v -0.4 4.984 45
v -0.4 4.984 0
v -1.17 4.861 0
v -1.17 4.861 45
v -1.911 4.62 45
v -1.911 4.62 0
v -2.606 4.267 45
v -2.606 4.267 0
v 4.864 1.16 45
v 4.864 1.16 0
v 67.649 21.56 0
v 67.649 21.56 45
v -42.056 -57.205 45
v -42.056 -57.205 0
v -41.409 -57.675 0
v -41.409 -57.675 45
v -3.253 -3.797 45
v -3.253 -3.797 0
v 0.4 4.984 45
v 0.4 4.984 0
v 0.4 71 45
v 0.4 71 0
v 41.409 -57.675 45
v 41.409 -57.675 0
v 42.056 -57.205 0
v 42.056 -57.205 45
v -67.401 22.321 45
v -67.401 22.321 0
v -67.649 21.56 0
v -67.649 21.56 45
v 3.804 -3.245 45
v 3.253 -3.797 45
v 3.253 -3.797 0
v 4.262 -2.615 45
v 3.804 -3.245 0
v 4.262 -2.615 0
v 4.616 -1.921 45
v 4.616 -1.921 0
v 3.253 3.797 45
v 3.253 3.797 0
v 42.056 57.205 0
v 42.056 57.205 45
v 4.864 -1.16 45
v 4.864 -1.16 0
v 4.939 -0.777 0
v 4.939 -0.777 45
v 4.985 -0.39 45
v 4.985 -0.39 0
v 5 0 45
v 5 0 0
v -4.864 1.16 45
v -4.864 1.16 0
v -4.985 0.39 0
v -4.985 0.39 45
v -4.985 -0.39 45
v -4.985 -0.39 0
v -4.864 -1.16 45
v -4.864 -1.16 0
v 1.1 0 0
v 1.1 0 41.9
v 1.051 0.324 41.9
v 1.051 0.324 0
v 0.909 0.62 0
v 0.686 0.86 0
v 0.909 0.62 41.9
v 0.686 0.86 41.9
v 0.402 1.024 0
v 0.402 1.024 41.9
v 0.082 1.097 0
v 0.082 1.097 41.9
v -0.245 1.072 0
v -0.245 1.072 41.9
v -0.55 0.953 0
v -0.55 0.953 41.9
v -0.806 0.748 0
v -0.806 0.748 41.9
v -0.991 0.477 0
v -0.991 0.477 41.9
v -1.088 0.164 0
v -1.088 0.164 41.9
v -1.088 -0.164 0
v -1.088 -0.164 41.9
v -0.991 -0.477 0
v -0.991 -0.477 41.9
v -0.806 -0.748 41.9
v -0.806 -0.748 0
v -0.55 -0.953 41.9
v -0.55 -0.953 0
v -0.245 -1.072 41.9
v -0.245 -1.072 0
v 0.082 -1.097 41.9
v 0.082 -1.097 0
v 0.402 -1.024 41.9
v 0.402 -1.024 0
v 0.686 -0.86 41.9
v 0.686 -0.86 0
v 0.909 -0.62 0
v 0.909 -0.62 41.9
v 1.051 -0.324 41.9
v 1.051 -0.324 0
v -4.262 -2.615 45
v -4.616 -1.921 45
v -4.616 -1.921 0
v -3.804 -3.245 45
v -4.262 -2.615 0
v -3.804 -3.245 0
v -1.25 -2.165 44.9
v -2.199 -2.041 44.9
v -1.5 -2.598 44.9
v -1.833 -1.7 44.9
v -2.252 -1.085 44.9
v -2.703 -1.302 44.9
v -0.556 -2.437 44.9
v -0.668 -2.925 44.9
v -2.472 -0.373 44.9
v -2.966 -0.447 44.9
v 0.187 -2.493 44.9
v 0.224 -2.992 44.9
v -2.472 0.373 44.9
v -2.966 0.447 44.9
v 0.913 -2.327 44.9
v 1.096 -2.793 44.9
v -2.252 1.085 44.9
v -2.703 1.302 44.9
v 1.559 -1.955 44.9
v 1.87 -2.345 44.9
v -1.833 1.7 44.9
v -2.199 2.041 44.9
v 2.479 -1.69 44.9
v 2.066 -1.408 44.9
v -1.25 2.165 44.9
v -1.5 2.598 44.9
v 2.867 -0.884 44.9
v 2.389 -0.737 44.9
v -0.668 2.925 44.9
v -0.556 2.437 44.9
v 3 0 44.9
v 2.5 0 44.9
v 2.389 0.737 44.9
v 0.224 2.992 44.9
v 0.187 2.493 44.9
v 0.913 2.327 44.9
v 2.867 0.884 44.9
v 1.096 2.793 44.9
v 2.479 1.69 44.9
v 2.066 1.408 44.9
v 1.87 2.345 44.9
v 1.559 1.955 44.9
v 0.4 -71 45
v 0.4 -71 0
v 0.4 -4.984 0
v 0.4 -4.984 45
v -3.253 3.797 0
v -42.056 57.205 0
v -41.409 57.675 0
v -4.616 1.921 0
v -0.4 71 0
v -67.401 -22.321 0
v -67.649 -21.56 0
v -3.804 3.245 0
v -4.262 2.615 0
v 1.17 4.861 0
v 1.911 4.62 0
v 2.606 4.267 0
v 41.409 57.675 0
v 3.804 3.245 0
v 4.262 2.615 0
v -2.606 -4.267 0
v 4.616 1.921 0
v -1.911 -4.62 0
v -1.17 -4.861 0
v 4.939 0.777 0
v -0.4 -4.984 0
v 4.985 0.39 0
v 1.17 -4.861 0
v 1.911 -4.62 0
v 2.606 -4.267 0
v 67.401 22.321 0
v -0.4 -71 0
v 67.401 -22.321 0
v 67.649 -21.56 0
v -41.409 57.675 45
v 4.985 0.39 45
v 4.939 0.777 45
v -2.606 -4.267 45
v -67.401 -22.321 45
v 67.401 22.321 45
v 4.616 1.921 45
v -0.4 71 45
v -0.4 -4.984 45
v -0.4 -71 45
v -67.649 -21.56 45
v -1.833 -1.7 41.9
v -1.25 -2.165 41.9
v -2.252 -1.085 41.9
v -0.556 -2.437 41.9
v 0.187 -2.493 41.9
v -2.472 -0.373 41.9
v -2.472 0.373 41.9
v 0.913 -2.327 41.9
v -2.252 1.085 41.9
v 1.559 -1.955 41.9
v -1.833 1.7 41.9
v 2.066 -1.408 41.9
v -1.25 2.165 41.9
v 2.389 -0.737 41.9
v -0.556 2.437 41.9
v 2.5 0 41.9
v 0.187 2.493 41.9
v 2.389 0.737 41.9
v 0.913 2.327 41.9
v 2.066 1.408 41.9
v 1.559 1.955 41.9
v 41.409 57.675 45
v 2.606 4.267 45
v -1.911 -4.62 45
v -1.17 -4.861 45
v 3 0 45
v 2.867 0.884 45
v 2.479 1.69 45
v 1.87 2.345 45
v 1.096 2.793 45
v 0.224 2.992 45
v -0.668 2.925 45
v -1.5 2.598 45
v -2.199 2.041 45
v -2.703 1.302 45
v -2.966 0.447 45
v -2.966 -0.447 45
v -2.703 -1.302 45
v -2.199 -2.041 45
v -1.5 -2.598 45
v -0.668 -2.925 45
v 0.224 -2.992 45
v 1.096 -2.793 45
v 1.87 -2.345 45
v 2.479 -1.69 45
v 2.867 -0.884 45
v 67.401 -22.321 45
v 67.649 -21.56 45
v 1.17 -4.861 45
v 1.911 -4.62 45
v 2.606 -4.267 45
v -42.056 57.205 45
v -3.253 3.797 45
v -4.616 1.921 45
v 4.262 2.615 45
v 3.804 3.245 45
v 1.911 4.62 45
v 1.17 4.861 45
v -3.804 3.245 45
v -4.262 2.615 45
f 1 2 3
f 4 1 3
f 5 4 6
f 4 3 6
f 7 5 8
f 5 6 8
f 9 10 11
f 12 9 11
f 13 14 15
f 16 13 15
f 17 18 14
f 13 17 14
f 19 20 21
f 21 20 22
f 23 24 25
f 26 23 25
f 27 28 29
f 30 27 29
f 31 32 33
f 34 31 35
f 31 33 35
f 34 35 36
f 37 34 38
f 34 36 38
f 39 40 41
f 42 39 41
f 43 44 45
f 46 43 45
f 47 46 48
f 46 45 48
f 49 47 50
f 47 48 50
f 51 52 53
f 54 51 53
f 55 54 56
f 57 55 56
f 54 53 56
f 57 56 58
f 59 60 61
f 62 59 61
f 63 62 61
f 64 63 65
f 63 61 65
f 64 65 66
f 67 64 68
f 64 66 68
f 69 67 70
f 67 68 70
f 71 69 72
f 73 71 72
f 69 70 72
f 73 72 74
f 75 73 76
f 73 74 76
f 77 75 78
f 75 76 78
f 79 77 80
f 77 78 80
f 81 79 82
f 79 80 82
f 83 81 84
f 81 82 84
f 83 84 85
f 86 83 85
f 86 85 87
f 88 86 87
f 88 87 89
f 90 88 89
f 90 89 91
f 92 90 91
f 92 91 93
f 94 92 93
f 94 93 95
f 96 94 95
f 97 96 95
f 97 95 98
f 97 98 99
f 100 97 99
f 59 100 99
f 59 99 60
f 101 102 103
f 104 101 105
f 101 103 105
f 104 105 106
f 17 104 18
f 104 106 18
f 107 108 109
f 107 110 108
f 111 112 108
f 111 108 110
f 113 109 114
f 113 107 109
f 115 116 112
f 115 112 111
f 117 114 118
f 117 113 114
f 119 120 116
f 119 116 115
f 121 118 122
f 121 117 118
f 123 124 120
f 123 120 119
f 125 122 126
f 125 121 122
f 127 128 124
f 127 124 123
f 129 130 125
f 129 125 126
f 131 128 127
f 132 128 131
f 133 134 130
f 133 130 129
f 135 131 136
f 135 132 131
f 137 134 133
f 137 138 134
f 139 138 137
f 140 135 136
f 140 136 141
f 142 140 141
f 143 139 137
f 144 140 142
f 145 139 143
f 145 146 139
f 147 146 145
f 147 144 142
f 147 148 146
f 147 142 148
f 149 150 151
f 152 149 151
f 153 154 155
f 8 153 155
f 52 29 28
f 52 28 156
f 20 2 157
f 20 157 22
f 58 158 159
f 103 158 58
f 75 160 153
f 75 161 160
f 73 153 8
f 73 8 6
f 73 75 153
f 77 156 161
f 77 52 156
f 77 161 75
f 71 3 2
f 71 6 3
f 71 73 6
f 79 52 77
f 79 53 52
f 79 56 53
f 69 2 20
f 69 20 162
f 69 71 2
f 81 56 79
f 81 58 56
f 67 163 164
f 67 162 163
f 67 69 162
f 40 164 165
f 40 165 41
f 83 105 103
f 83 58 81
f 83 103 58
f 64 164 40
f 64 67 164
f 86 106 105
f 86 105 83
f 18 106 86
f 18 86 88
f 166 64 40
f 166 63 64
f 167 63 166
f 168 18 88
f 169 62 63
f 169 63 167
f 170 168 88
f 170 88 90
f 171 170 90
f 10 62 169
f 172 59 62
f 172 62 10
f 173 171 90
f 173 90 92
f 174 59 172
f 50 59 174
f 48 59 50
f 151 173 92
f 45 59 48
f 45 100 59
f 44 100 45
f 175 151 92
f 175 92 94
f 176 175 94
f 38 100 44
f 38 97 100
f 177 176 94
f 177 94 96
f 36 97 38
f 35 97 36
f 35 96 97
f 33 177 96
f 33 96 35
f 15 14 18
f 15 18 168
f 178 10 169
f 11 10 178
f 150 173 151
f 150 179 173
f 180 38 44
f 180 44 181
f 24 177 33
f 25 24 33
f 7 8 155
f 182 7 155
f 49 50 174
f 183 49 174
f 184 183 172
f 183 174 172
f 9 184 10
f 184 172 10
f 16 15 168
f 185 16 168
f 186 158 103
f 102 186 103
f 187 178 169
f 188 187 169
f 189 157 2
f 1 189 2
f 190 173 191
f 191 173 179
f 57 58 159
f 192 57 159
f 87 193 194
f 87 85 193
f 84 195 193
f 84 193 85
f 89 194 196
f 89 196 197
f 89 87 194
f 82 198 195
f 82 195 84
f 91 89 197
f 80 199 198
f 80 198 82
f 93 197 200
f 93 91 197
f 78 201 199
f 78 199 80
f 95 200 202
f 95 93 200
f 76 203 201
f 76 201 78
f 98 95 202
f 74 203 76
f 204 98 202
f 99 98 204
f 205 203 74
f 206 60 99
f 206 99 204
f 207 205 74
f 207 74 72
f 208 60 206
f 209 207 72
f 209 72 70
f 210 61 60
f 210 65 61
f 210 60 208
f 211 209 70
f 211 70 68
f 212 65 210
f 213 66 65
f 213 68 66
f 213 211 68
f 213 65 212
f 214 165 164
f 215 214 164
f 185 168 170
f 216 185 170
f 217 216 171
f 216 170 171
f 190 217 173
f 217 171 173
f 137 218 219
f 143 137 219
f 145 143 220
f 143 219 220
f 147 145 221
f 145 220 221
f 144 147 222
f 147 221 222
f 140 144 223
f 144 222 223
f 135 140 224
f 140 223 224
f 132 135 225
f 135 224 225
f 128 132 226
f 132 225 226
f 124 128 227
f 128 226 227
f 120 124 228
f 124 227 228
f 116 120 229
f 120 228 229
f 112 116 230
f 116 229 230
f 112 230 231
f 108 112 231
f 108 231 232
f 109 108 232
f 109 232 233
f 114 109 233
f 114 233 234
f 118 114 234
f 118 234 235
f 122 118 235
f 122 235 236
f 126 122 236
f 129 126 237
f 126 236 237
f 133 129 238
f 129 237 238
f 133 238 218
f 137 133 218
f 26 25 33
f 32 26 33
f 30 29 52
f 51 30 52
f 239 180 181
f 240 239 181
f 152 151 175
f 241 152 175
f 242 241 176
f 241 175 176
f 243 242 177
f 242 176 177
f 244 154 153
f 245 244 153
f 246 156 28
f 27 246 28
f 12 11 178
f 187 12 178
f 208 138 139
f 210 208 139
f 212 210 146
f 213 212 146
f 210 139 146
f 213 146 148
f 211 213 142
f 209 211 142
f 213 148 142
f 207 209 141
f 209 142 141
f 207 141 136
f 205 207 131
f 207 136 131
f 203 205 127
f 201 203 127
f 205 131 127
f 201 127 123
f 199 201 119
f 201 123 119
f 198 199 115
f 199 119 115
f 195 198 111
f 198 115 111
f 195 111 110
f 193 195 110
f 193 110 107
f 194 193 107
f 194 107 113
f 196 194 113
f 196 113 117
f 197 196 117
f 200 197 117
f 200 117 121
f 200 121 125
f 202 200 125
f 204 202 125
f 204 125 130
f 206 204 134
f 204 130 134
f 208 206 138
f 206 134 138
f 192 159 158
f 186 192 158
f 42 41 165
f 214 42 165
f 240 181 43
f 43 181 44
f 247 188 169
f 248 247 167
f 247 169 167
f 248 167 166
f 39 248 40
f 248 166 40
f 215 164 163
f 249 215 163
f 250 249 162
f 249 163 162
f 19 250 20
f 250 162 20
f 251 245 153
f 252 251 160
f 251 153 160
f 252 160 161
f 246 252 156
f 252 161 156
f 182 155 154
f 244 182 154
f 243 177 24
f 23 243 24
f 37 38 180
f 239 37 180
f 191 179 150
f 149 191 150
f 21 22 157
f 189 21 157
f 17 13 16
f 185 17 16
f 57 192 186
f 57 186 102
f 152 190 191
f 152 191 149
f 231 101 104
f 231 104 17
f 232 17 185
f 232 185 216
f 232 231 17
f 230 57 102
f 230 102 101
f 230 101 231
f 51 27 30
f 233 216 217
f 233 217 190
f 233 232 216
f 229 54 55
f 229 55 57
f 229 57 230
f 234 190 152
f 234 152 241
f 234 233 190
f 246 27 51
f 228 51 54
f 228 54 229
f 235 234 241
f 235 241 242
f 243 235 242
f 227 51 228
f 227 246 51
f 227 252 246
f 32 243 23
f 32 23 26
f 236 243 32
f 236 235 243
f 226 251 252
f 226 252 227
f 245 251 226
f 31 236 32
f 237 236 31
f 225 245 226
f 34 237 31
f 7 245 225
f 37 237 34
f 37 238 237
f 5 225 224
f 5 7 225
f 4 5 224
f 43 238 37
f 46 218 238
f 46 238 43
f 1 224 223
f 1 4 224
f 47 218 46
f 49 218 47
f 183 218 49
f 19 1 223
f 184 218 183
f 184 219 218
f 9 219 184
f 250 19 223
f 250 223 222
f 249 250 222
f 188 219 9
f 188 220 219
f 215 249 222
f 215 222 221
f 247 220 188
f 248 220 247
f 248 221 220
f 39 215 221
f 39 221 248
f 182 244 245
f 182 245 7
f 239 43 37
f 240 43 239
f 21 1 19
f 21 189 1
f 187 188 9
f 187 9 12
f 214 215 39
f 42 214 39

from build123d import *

# Parameters (mm, degrees)
F1_DEPTH = 45
F3_DEPTH = 45
F4_R     = 1.1
F5_DEPTH = 45
F6_R     = 3
F7_DEPTH = 0.1
F8_R     = 2.5
F9_DEPTH = 3


with BuildPart() as f1:
    # F0 (on Top) → F1 (new body)
    with BuildSketch(Plane.XY):
        with BuildLine():
            ThreePointArc((4.8636480497, -1.1597101572), (4.9657950143, -0.5838491892), (5, 0))
            ThreePointArc((5, 0), (4.9657950143, 0.5838491892), (4.8636480497, 1.1597101572))
            Line((4.8636480497, 1.1597101572), (1.294427191, 0))
            Line((1.294427191, 0), (4.8636480497, -1.1597101572))
        make_face()
        with BuildLine():
            Line((1.294427191, 0), (4.8636480497, 1.1597101572))
            ThreePointArc((4.8636480497, 1.1597101572), (4.7552825815, 1.5450849719), (4.6164344542, 1.9205553702))
            Line((4.6164344542, 1.9205553702), (1.0472135955, 0.760845213))
            Line((1.0472135955, 0.760845213), (0.6472135955, 0.2102924448))
            Line((0.6472135955, 0.2102924448), (1.294427191, 0))
        make_face()
        with BuildLine():
            ThreePointArc((4.6164344542, 1.9205553702), (4.7552825815, 1.5450849719), (4.8636480497, 1.1597101572))
            Line((4.8636480497, 1.1597101572), (67.6486194547, 21.5597839941))
            Line((67.6486194547, 21.5597839941), (67.4014058592, 22.3206292071))
            Line((67.4014058592, 22.3206292071), (4.6164344542, 1.9205553702))
        make_face()
        with BuildLine():
            Line((67.6486194547, -21.5597839941), (4.8636480497, -1.1597101572))
            ThreePointArc((4.8636480497, -1.1597101572), (4.7552825815, -1.5450849719), (4.6164344542, -1.9205553702))
            Line((4.6164344542, -1.9205553702), (67.4014058592, -22.3206292071))
            Line((67.4014058592, -22.3206292071), (67.6486194547, -21.5597839941))
        make_face()
        with BuildLine():
            ThreePointArc((4.6164344542, -1.9205553702), (4.7552825815, -1.5450849719), (4.8636480497, -1.1597101572))
            Line((4.8636480497, -1.1597101572), (1.294427191, 0))
            Line((1.294427191, 0), (0.6472135955, -0.2102924448))
            Line((0.6472135955, -0.2102924448), (1.0472135955, -0.760845213))
            Line((1.0472135955, -0.760845213), (4.6164344542, -1.9205553702))
        make_face()
        with BuildLine():
            Line((1.0472135955, 0.760845213), (4.6164344542, 1.9205553702))
            ThreePointArc((4.6164344542, 1.9205553702), (4.0450849719, 2.9389262615), (3.2531133995, 3.7970058217))
            Line((3.2531133995, 3.7970058217), (1.0472135955, 0.760845213))
        make_face()
        with BuildLine():
            ThreePointArc((3.2531133995, -3.7970058217), (4.0450849719, -2.9389262615), (4.6164344542, -1.9205553702))
            Line((4.6164344542, -1.9205553702), (1.0472135955, -0.760845213))
            Line((1.0472135955, -0.760845213), (3.2531133995, -3.7970058217))
        make_face()
        with BuildLine():
            Line((1.0472135955, 0.760845213), (3.2531133995, 3.7970058217))
            ThreePointArc((3.2531133995, 3.7970058217), (2.9389262615, 4.0450849719), (2.605899804, 4.2672340235))
            Line((2.605899804, 4.2672340235), (0.4, 1.2310734149))
            Line((0.4, 1.2310734149), (0.4, 0.5505527682))
            Line((0.4, 0.5505527682), (1.0472135955, 0.760845213))
        make_face()
        with BuildLine():
            ThreePointArc((2.605899804, 4.2672340235), (2.9389262615, 4.0450849719), (3.2531133995, 3.7970058217))
            Line((3.2531133995, 3.7970058217), (42.0563597105, 57.2050924997))
            Line((42.0563597105, 57.2050924997), (41.409146115, 57.6753207015))
            Line((41.409146115, 57.6753207015), (2.605899804, 4.2672340235))
        make_face()
        with BuildLine():
            Line((42.0563597105, -57.2050924997), (3.2531133995, -3.7970058217))
            ThreePointArc((3.2531133995, -3.7970058217), (2.9389262615, -4.0450849719), (2.605899804, -4.2672340235))
            Line((2.605899804, -4.2672340235), (41.409146115, -57.6753207015))
            Line((41.409146115, -57.6753207015), (42.0563597105, -57.2050924997))
        make_face()
        with BuildLine():
            ThreePointArc((2.605899804, -4.2672340235), (2.9389262615, -4.0450849719), (3.2531133995, -3.7970058217))
            Line((3.2531133995, -3.7970058217), (1.0472135955, -0.760845213))
            Line((1.0472135955, -0.760845213), (0.4, -0.5505527682))
            Line((0.4, -0.5505527682), (0.4, -1.2310734149))
            Line((0.4, -1.2310734149), (2.605899804, -4.2672340235))
        make_face()
        with BuildLine():
            Line((0.4, 1.2310734149), (2.605899804, 4.2672340235))
            ThreePointArc((2.605899804, 4.2672340235), (1.5450849719, 4.7552825815), (0.4, 4.9839743178))
            Line((0.4, 4.9839743178), (0.4, 1.2310734149))
        make_face()
        with BuildLine():
            ThreePointArc((0.4, -4.9839743178), (1.5450849719, -4.7552825815), (2.605899804, -4.2672340235))
            Line((2.605899804, -4.2672340235), (0.4, -1.2310734149))
            Line((0.4, -1.2310734149), (0.4, -4.9839743178))
        make_face()
        with BuildLine():
            Line((0.4, 1.2310734149), (0.4, 4.9839743178))
            ThreePointArc((0.4, 4.9839743178), (0, 5), (-0.4, 4.9839743178))
            Line((-0.4, 4.9839743178), (-0.4, 1.2310734149))
            Line((-0.4, 1.2310734149), (0, 0.6805206467))
            Line((0, 0.6805206467), (0.4, 1.2310734149))
        make_face()
        with BuildLine():
            ThreePointArc((-0.4, 4.9839743178), (0, 5), (0.4, 4.9839743178))
            Line((0.4, 4.9839743178), (0.4, 71))
            Line((0.4, 71), (-0.4, 71))
            Line((-0.4, 71), (-0.4, 4.9839743178))
        make_face()
        with BuildLine():
            Line((0.4, -71), (0.4, -4.9839743178))
            ThreePointArc((0.4, -4.9839743178), (0, -5), (-0.4, -4.9839743178))
            Line((-0.4, -4.9839743178), (-0.4, -71))
            Line((-0.4, -71), (0.4, -71))
        make_face()
        with BuildLine():
            ThreePointArc((-0.4, -4.9839743178), (0, -5), (0.4, -4.9839743178))
            Line((0.4, -4.9839743178), (0.4, -1.2310734149))
            Line((0.4, -1.2310734149), (0, -0.6805206467))
            Line((0, -0.6805206467), (-0.4, -1.2310734149))
            Line((-0.4, -1.2310734149), (-0.4, -4.9839743178))
        make_face()
        with BuildLine():
            Line((-0.4, 1.2310734149), (-0.4, 4.9839743178))
            ThreePointArc((-0.4, 4.9839743178), (-1.5450849719, 4.7552825815), (-2.605899804, 4.2672340235))
            Line((-2.605899804, 4.2672340235), (-0.4, 1.2310734149))
        make_face()
        with BuildLine():
            ThreePointArc((-2.605899804, -4.2672340235), (-1.5450849719, -4.7552825815), (-0.4, -4.9839743178))
            Line((-0.4, -4.9839743178), (-0.4, -1.2310734149))
            Line((-0.4, -1.2310734149), (-2.605899804, -4.2672340235))
        make_face()
        with BuildLine():
            Line((-0.4, 1.2310734149), (-2.605899804, 4.2672340235))
            ThreePointArc((-2.605899804, 4.2672340235), (-2.9389262615, 4.0450849719), (-3.2531133995, 3.7970058217))
            Line((-3.2531133995, 3.7970058217), (-1.0472135955, 0.760845213))
            Line((-1.0472135955, 0.760845213), (-0.4, 0.5505527682))
            Line((-0.4, 0.5505527682), (-0.4, 1.2310734149))
        make_face()
        with BuildLine():
            ThreePointArc((-3.2531133995, 3.7970058217), (-2.9389262615, 4.0450849719), (-2.605899804, 4.2672340235))
            Line((-2.605899804, 4.2672340235), (-41.409146115, 57.6753207015))
            Line((-41.409146115, 57.6753207015), (-42.0563597105, 57.2050924997))
            Line((-42.0563597105, 57.2050924997), (-3.2531133995, 3.7970058217))
        make_face()
        with BuildLine():
            Line((-41.409146115, -57.6753207015), (-2.605899804, -4.2672340235))
            ThreePointArc((-2.605899804, -4.2672340235), (-2.9389262615, -4.0450849719), (-3.2531133995, -3.7970058217))
            Line((-3.2531133995, -3.7970058217), (-42.0563597105, -57.2050924997))
            Line((-42.0563597105, -57.2050924997), (-41.409146115, -57.6753207015))
        make_face()
        with BuildLine():
            ThreePointArc((-3.2531133995, -3.7970058217), (-2.9389262615, -4.0450849719), (-2.605899804, -4.2672340235))
            Line((-2.605899804, -4.2672340235), (-0.4, -1.2310734149))
            Line((-0.4, -1.2310734149), (-0.4, -0.5505527682))
            Line((-0.4, -0.5505527682), (-1.0472135955, -0.760845213))
            Line((-1.0472135955, -0.760845213), (-3.2531133995, -3.7970058217))
        make_face()
        with BuildLine():
            Line((-1.0472135955, 0.760845213), (-3.2531133995, 3.7970058217))
            ThreePointArc((-3.2531133995, 3.7970058217), (-4.0450849719, 2.9389262615), (-4.6164344542, 1.9205553702))
            Line((-4.6164344542, 1.9205553702), (-1.0472135955, 0.760845213))
        make_face()
        with BuildLine():
            ThreePointArc((-4.6164344542, -1.9205553702), (-4.0450849719, -2.9389262615), (-3.2531133995, -3.7970058217))
            Line((-3.2531133995, -3.7970058217), (-1.0472135955, -0.760845213))
            Line((-1.0472135955, -0.760845213), (-4.6164344542, -1.9205553702))
        make_face()
        with BuildLine():
            Line((-1.0472135955, 0.760845213), (-4.6164344542, 1.9205553702))
            ThreePointArc((-4.6164344542, 1.9205553702), (-4.7552825815, 1.5450849719), (-4.8636480497, 1.1597101572))
            Line((-4.8636480497, 1.1597101572), (-1.294427191, 0))
            Line((-1.294427191, 0), (-0.6472135955, 0.2102924448))
            Line((-0.6472135955, 0.2102924448), (-1.0472135955, 0.760845213))
        make_face()
        with BuildLine():
            ThreePointArc((-4.8636480497, 1.1597101572), (-4.7552825815, 1.5450849719), (-4.6164344542, 1.9205553702))
            Line((-4.6164344542, 1.9205553702), (-67.4014058592, 22.3206292071))
            Line((-67.4014058592, 22.3206292071), (-67.6486194547, 21.5597839941))
            Line((-67.6486194547, 21.5597839941), (-4.8636480497, 1.1597101572))
        make_face()
        with BuildLine():
            Line((-67.4014058592, -22.3206292071), (-4.6164344542, -1.9205553702))
            ThreePointArc((-4.6164344542, -1.9205553702), (-4.7552825815, -1.5450849719), (-4.8636480497, -1.1597101572))
            Line((-4.8636480497, -1.1597101572), (-67.6486194547, -21.5597839941))
            Line((-67.6486194547, -21.5597839941), (-67.4014058592, -22.3206292071))
        make_face()
        with BuildLine():
            ThreePointArc((-4.8636480497, -1.1597101572), (-4.7552825815, -1.5450849719), (-4.6164344542, -1.9205553702))
            Line((-4.6164344542, -1.9205553702), (-1.0472135955, -0.760845213))
            Line((-1.0472135955, -0.760845213), (-0.6472135955, -0.2102924448))
            Line((-0.6472135955, -0.2102924448), (-1.294427191, 0))
            Line((-1.294427191, 0), (-4.8636480497, -1.1597101572))
        make_face()
        with BuildLine():
            Line((-1.294427191, 0), (-4.8636480497, 1.1597101572))
            ThreePointArc((-4.8636480497, 1.1597101572), (-5, 0), (-4.8636480497, -1.1597101572))
            Line((-4.8636480497, -1.1597101572), (-1.294427191, 0))
        make_face()
    extrude(amount=F1_DEPTH)

    # F2 (on face) → F3 (join)
    with BuildSketch(Plane(origin=(0, 0, 0), x_dir=(1, 0, 0), z_dir=(0, 0, -1))):
        Polygon((0.4, 1.2310734149), (0, 0.6805206467), (-0.4, 1.2310734149), (-0.4, 0.5505527682), (-1.0472135955, 0.760845213), (-0.6472135955, 0.2102924448), (-1.294427191, 0), (-0.6472135955, -0.2102924448), (-1.0472135955, -0.760845213), (-0.4, -0.5505527682), (-0.4, -1.2310734149), (0, -0.6805206467), (0.4, -1.2310734149), (0.4, -0.5505527682), (1.0472135955, -0.760845213), (0.6472135955, -0.2102924448), (1.294427191, 0), (0.6472135955, 0.2102924448), (1.0472135955, 0.760845213), (0.4, 0.5505527682), align=None)
    extrude(amount=-F3_DEPTH)

    # F4 (on face) → F5 (cut, through all)
    with BuildSketch(Plane.XY.offset(45)):
        Circle(F4_R)
    extrude(amount=-F5_DEPTH, mode=Mode.SUBTRACT)

    # F6 (on face) → F7 (cut)
    with BuildSketch(Plane.XY.offset(45)):
        Circle(F6_R)
    extrude(amount=-F7_DEPTH, mode=Mode.SUBTRACT)

    # F8 (on face) → F9 (cut)
    with BuildSketch(Plane.XY.offset(44.9)):
        Circle(F8_R)
    extrude(amount=-F9_DEPTH, mode=Mode.SUBTRACT)


solid = f1.part
